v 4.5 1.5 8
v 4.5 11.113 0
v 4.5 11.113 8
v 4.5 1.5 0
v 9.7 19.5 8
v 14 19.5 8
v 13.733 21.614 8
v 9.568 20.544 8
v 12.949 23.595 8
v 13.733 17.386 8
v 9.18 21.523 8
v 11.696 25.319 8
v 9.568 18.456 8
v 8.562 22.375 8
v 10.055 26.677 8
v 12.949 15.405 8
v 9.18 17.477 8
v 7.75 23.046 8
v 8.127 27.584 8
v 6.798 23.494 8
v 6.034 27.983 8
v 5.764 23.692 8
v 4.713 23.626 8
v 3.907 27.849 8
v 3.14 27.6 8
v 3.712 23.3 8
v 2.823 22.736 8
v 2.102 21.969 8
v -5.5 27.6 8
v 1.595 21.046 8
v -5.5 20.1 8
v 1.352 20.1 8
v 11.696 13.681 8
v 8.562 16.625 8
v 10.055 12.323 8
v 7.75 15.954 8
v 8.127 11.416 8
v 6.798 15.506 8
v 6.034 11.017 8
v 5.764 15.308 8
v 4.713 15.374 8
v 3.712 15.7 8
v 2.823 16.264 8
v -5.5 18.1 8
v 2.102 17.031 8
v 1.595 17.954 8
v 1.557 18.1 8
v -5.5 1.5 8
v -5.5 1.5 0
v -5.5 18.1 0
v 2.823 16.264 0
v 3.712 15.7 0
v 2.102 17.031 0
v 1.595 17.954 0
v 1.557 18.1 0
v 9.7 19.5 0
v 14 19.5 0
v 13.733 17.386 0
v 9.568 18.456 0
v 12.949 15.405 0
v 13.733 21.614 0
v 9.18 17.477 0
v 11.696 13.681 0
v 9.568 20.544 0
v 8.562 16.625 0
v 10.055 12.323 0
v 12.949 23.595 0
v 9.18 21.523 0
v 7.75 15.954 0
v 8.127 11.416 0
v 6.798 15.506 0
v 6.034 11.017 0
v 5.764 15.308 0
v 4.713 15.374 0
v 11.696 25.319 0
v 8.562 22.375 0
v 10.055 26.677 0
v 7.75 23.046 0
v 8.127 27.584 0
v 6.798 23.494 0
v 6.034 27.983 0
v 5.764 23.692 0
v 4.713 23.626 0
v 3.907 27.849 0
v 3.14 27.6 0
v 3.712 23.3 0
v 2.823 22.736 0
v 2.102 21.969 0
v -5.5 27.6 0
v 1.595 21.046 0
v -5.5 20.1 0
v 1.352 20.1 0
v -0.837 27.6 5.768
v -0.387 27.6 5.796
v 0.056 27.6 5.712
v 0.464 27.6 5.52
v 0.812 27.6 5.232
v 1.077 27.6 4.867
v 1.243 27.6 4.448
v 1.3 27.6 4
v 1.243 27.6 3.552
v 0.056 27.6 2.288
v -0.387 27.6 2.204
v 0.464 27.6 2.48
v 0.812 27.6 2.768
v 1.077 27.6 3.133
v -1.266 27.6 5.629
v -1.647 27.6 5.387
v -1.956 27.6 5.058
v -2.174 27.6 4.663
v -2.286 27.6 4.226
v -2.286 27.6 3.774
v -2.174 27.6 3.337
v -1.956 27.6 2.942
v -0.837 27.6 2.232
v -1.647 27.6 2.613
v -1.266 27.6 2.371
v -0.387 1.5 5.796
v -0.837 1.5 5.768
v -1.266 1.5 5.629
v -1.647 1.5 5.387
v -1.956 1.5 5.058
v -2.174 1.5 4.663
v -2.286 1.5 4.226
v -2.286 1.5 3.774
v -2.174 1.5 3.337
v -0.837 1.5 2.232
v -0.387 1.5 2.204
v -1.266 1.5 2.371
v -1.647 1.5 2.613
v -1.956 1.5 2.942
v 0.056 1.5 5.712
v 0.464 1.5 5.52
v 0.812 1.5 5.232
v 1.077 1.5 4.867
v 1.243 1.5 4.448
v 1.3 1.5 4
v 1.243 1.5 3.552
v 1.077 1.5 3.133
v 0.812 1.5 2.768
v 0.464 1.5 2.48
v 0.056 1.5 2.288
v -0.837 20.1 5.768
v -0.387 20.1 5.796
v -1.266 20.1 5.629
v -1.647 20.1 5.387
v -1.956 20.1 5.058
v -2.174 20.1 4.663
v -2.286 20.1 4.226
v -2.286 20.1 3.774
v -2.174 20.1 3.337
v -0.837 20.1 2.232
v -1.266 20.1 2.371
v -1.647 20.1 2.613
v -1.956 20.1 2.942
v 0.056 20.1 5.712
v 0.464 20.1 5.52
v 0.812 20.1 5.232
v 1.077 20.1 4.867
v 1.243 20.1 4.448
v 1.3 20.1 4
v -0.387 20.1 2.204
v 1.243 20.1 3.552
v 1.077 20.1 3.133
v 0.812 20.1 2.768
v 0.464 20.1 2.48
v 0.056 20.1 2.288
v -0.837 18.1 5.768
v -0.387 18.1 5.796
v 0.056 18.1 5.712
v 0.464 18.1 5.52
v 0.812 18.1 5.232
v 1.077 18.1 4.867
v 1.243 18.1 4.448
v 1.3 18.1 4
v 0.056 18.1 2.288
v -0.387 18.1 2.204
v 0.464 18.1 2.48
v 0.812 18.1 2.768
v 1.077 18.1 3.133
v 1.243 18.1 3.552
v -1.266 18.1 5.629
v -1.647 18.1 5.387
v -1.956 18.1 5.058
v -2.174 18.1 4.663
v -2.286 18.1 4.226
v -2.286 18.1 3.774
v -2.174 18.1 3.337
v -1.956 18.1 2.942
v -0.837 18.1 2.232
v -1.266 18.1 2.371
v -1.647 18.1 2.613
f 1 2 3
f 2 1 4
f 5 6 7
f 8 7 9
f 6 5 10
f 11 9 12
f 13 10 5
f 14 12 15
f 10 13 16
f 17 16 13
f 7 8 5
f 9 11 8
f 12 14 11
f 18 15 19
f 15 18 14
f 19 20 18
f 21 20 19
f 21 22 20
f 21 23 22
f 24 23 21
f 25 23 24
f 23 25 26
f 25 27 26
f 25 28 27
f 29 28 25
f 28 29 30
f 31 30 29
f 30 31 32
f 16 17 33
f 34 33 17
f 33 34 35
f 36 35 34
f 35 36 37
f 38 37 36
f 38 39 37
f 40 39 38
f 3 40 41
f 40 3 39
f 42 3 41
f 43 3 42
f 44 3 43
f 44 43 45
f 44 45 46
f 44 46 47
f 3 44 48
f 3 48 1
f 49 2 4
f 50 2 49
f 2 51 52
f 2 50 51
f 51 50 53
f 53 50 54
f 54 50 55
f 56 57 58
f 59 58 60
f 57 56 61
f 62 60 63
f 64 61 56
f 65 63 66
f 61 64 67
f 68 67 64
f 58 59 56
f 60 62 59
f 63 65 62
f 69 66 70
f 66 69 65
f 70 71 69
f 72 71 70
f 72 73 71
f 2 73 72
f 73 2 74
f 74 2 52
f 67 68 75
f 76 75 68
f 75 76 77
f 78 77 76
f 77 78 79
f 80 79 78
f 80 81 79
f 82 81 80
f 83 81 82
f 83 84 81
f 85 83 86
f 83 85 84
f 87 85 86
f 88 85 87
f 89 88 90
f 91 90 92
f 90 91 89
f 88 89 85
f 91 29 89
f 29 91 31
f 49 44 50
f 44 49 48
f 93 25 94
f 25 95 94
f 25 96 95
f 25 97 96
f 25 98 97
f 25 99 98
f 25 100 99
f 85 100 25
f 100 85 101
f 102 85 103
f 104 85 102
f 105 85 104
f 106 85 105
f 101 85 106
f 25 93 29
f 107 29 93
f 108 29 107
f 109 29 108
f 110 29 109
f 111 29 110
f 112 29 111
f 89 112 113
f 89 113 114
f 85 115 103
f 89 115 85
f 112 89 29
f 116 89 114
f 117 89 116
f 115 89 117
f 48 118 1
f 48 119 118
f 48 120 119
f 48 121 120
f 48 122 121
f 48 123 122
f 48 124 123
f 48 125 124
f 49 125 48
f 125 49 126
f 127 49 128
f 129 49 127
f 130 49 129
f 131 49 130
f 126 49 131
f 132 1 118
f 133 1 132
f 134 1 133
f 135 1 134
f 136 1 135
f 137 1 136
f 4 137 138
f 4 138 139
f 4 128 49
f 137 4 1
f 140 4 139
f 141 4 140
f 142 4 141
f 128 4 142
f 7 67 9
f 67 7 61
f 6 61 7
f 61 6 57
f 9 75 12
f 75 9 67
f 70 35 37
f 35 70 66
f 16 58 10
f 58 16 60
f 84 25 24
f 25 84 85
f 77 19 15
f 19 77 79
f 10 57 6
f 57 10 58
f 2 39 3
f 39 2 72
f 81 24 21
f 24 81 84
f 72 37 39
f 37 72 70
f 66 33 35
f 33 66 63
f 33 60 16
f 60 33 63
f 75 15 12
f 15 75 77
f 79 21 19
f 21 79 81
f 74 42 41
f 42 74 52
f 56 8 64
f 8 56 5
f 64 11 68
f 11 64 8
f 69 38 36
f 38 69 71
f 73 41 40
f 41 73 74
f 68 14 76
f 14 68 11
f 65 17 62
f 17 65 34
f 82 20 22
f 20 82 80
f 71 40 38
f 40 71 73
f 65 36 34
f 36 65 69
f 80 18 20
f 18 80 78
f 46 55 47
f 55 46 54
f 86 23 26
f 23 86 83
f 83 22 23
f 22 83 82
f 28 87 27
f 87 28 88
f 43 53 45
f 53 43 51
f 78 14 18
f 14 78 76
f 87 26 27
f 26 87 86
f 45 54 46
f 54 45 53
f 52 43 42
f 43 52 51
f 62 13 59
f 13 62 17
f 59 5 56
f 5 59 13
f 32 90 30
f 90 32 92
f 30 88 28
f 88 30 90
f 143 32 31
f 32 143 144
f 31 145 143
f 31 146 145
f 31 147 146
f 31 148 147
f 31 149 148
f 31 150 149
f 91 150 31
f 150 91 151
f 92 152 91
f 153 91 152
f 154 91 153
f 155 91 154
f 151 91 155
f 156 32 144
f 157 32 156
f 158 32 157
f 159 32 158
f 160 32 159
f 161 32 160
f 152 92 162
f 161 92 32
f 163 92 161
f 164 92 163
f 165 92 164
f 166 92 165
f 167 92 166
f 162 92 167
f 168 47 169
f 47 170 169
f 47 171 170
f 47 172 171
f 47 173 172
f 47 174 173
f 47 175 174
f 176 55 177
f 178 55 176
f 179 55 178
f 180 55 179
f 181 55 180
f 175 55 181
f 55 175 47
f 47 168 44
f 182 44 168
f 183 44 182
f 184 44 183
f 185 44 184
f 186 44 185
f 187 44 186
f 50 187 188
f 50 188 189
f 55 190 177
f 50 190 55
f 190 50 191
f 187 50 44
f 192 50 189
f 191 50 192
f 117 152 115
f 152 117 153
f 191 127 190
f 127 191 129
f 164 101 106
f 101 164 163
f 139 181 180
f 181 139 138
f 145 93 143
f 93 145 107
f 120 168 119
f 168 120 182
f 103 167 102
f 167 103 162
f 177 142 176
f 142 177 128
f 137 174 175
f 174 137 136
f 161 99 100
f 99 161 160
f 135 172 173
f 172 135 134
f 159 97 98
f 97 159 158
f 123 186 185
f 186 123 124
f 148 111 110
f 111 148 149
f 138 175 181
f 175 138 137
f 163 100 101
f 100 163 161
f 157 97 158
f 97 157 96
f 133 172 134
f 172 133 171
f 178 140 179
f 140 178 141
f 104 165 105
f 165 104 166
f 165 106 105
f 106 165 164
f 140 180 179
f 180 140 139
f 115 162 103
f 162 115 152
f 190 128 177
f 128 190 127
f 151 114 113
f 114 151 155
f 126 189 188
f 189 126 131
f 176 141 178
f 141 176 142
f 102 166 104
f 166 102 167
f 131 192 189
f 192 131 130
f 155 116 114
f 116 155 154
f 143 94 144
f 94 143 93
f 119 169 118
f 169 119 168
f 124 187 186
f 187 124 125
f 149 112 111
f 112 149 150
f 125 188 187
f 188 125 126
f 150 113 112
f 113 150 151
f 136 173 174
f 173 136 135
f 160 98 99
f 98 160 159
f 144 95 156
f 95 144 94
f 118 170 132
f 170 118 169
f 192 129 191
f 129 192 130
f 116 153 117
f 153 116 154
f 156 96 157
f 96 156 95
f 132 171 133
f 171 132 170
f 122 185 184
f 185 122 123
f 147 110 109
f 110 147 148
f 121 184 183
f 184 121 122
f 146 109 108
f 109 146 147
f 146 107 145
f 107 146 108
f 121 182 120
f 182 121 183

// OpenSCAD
//import("/home/mark/Dropbox/printrbot/things/printrbot/pb-BeltClip-x2.stl");
//#import("/home/mark/Dropbox/printrbot/things/printrbot/pb-Y-BarEnd-x4.stl");

stem_extension = 3.6;
len =22.5 + stem_extension;
wid =10;
ht   =8;
cq  = 25;
slot_len = 2;

cyl_wid=8.5;
hole_wid=1.8;

xoff=-0.5*wid - 0.5;
yoff=1.5;

xco = 11;
yco = 14.4 + stem_extension;
module p() {
 difference() {
  union() {
   cube(size=[wid, len, ht]);
   translate([xco, yco, 0]) difference()
    cylinder(r=cyl_wid, h=ht, $fn=cq);
  }
  translate([xco,yco,-1]) cylinder(r=cyl_wid - 4.3, h=ht+2, $fn=cq);
 }
}


translate([xoff,yoff,0]) {
 difference() {
  p();
  translate([-1,13+stem_extension,-1])
   cube(size=[wid+2, slot_len, ht+2]);
  rotate([-90,0,0]) translate([wid/2, ht/-2,-5]) #cylinder(r=hole_wid, h=len+10, $fn=cq);
 }
}
